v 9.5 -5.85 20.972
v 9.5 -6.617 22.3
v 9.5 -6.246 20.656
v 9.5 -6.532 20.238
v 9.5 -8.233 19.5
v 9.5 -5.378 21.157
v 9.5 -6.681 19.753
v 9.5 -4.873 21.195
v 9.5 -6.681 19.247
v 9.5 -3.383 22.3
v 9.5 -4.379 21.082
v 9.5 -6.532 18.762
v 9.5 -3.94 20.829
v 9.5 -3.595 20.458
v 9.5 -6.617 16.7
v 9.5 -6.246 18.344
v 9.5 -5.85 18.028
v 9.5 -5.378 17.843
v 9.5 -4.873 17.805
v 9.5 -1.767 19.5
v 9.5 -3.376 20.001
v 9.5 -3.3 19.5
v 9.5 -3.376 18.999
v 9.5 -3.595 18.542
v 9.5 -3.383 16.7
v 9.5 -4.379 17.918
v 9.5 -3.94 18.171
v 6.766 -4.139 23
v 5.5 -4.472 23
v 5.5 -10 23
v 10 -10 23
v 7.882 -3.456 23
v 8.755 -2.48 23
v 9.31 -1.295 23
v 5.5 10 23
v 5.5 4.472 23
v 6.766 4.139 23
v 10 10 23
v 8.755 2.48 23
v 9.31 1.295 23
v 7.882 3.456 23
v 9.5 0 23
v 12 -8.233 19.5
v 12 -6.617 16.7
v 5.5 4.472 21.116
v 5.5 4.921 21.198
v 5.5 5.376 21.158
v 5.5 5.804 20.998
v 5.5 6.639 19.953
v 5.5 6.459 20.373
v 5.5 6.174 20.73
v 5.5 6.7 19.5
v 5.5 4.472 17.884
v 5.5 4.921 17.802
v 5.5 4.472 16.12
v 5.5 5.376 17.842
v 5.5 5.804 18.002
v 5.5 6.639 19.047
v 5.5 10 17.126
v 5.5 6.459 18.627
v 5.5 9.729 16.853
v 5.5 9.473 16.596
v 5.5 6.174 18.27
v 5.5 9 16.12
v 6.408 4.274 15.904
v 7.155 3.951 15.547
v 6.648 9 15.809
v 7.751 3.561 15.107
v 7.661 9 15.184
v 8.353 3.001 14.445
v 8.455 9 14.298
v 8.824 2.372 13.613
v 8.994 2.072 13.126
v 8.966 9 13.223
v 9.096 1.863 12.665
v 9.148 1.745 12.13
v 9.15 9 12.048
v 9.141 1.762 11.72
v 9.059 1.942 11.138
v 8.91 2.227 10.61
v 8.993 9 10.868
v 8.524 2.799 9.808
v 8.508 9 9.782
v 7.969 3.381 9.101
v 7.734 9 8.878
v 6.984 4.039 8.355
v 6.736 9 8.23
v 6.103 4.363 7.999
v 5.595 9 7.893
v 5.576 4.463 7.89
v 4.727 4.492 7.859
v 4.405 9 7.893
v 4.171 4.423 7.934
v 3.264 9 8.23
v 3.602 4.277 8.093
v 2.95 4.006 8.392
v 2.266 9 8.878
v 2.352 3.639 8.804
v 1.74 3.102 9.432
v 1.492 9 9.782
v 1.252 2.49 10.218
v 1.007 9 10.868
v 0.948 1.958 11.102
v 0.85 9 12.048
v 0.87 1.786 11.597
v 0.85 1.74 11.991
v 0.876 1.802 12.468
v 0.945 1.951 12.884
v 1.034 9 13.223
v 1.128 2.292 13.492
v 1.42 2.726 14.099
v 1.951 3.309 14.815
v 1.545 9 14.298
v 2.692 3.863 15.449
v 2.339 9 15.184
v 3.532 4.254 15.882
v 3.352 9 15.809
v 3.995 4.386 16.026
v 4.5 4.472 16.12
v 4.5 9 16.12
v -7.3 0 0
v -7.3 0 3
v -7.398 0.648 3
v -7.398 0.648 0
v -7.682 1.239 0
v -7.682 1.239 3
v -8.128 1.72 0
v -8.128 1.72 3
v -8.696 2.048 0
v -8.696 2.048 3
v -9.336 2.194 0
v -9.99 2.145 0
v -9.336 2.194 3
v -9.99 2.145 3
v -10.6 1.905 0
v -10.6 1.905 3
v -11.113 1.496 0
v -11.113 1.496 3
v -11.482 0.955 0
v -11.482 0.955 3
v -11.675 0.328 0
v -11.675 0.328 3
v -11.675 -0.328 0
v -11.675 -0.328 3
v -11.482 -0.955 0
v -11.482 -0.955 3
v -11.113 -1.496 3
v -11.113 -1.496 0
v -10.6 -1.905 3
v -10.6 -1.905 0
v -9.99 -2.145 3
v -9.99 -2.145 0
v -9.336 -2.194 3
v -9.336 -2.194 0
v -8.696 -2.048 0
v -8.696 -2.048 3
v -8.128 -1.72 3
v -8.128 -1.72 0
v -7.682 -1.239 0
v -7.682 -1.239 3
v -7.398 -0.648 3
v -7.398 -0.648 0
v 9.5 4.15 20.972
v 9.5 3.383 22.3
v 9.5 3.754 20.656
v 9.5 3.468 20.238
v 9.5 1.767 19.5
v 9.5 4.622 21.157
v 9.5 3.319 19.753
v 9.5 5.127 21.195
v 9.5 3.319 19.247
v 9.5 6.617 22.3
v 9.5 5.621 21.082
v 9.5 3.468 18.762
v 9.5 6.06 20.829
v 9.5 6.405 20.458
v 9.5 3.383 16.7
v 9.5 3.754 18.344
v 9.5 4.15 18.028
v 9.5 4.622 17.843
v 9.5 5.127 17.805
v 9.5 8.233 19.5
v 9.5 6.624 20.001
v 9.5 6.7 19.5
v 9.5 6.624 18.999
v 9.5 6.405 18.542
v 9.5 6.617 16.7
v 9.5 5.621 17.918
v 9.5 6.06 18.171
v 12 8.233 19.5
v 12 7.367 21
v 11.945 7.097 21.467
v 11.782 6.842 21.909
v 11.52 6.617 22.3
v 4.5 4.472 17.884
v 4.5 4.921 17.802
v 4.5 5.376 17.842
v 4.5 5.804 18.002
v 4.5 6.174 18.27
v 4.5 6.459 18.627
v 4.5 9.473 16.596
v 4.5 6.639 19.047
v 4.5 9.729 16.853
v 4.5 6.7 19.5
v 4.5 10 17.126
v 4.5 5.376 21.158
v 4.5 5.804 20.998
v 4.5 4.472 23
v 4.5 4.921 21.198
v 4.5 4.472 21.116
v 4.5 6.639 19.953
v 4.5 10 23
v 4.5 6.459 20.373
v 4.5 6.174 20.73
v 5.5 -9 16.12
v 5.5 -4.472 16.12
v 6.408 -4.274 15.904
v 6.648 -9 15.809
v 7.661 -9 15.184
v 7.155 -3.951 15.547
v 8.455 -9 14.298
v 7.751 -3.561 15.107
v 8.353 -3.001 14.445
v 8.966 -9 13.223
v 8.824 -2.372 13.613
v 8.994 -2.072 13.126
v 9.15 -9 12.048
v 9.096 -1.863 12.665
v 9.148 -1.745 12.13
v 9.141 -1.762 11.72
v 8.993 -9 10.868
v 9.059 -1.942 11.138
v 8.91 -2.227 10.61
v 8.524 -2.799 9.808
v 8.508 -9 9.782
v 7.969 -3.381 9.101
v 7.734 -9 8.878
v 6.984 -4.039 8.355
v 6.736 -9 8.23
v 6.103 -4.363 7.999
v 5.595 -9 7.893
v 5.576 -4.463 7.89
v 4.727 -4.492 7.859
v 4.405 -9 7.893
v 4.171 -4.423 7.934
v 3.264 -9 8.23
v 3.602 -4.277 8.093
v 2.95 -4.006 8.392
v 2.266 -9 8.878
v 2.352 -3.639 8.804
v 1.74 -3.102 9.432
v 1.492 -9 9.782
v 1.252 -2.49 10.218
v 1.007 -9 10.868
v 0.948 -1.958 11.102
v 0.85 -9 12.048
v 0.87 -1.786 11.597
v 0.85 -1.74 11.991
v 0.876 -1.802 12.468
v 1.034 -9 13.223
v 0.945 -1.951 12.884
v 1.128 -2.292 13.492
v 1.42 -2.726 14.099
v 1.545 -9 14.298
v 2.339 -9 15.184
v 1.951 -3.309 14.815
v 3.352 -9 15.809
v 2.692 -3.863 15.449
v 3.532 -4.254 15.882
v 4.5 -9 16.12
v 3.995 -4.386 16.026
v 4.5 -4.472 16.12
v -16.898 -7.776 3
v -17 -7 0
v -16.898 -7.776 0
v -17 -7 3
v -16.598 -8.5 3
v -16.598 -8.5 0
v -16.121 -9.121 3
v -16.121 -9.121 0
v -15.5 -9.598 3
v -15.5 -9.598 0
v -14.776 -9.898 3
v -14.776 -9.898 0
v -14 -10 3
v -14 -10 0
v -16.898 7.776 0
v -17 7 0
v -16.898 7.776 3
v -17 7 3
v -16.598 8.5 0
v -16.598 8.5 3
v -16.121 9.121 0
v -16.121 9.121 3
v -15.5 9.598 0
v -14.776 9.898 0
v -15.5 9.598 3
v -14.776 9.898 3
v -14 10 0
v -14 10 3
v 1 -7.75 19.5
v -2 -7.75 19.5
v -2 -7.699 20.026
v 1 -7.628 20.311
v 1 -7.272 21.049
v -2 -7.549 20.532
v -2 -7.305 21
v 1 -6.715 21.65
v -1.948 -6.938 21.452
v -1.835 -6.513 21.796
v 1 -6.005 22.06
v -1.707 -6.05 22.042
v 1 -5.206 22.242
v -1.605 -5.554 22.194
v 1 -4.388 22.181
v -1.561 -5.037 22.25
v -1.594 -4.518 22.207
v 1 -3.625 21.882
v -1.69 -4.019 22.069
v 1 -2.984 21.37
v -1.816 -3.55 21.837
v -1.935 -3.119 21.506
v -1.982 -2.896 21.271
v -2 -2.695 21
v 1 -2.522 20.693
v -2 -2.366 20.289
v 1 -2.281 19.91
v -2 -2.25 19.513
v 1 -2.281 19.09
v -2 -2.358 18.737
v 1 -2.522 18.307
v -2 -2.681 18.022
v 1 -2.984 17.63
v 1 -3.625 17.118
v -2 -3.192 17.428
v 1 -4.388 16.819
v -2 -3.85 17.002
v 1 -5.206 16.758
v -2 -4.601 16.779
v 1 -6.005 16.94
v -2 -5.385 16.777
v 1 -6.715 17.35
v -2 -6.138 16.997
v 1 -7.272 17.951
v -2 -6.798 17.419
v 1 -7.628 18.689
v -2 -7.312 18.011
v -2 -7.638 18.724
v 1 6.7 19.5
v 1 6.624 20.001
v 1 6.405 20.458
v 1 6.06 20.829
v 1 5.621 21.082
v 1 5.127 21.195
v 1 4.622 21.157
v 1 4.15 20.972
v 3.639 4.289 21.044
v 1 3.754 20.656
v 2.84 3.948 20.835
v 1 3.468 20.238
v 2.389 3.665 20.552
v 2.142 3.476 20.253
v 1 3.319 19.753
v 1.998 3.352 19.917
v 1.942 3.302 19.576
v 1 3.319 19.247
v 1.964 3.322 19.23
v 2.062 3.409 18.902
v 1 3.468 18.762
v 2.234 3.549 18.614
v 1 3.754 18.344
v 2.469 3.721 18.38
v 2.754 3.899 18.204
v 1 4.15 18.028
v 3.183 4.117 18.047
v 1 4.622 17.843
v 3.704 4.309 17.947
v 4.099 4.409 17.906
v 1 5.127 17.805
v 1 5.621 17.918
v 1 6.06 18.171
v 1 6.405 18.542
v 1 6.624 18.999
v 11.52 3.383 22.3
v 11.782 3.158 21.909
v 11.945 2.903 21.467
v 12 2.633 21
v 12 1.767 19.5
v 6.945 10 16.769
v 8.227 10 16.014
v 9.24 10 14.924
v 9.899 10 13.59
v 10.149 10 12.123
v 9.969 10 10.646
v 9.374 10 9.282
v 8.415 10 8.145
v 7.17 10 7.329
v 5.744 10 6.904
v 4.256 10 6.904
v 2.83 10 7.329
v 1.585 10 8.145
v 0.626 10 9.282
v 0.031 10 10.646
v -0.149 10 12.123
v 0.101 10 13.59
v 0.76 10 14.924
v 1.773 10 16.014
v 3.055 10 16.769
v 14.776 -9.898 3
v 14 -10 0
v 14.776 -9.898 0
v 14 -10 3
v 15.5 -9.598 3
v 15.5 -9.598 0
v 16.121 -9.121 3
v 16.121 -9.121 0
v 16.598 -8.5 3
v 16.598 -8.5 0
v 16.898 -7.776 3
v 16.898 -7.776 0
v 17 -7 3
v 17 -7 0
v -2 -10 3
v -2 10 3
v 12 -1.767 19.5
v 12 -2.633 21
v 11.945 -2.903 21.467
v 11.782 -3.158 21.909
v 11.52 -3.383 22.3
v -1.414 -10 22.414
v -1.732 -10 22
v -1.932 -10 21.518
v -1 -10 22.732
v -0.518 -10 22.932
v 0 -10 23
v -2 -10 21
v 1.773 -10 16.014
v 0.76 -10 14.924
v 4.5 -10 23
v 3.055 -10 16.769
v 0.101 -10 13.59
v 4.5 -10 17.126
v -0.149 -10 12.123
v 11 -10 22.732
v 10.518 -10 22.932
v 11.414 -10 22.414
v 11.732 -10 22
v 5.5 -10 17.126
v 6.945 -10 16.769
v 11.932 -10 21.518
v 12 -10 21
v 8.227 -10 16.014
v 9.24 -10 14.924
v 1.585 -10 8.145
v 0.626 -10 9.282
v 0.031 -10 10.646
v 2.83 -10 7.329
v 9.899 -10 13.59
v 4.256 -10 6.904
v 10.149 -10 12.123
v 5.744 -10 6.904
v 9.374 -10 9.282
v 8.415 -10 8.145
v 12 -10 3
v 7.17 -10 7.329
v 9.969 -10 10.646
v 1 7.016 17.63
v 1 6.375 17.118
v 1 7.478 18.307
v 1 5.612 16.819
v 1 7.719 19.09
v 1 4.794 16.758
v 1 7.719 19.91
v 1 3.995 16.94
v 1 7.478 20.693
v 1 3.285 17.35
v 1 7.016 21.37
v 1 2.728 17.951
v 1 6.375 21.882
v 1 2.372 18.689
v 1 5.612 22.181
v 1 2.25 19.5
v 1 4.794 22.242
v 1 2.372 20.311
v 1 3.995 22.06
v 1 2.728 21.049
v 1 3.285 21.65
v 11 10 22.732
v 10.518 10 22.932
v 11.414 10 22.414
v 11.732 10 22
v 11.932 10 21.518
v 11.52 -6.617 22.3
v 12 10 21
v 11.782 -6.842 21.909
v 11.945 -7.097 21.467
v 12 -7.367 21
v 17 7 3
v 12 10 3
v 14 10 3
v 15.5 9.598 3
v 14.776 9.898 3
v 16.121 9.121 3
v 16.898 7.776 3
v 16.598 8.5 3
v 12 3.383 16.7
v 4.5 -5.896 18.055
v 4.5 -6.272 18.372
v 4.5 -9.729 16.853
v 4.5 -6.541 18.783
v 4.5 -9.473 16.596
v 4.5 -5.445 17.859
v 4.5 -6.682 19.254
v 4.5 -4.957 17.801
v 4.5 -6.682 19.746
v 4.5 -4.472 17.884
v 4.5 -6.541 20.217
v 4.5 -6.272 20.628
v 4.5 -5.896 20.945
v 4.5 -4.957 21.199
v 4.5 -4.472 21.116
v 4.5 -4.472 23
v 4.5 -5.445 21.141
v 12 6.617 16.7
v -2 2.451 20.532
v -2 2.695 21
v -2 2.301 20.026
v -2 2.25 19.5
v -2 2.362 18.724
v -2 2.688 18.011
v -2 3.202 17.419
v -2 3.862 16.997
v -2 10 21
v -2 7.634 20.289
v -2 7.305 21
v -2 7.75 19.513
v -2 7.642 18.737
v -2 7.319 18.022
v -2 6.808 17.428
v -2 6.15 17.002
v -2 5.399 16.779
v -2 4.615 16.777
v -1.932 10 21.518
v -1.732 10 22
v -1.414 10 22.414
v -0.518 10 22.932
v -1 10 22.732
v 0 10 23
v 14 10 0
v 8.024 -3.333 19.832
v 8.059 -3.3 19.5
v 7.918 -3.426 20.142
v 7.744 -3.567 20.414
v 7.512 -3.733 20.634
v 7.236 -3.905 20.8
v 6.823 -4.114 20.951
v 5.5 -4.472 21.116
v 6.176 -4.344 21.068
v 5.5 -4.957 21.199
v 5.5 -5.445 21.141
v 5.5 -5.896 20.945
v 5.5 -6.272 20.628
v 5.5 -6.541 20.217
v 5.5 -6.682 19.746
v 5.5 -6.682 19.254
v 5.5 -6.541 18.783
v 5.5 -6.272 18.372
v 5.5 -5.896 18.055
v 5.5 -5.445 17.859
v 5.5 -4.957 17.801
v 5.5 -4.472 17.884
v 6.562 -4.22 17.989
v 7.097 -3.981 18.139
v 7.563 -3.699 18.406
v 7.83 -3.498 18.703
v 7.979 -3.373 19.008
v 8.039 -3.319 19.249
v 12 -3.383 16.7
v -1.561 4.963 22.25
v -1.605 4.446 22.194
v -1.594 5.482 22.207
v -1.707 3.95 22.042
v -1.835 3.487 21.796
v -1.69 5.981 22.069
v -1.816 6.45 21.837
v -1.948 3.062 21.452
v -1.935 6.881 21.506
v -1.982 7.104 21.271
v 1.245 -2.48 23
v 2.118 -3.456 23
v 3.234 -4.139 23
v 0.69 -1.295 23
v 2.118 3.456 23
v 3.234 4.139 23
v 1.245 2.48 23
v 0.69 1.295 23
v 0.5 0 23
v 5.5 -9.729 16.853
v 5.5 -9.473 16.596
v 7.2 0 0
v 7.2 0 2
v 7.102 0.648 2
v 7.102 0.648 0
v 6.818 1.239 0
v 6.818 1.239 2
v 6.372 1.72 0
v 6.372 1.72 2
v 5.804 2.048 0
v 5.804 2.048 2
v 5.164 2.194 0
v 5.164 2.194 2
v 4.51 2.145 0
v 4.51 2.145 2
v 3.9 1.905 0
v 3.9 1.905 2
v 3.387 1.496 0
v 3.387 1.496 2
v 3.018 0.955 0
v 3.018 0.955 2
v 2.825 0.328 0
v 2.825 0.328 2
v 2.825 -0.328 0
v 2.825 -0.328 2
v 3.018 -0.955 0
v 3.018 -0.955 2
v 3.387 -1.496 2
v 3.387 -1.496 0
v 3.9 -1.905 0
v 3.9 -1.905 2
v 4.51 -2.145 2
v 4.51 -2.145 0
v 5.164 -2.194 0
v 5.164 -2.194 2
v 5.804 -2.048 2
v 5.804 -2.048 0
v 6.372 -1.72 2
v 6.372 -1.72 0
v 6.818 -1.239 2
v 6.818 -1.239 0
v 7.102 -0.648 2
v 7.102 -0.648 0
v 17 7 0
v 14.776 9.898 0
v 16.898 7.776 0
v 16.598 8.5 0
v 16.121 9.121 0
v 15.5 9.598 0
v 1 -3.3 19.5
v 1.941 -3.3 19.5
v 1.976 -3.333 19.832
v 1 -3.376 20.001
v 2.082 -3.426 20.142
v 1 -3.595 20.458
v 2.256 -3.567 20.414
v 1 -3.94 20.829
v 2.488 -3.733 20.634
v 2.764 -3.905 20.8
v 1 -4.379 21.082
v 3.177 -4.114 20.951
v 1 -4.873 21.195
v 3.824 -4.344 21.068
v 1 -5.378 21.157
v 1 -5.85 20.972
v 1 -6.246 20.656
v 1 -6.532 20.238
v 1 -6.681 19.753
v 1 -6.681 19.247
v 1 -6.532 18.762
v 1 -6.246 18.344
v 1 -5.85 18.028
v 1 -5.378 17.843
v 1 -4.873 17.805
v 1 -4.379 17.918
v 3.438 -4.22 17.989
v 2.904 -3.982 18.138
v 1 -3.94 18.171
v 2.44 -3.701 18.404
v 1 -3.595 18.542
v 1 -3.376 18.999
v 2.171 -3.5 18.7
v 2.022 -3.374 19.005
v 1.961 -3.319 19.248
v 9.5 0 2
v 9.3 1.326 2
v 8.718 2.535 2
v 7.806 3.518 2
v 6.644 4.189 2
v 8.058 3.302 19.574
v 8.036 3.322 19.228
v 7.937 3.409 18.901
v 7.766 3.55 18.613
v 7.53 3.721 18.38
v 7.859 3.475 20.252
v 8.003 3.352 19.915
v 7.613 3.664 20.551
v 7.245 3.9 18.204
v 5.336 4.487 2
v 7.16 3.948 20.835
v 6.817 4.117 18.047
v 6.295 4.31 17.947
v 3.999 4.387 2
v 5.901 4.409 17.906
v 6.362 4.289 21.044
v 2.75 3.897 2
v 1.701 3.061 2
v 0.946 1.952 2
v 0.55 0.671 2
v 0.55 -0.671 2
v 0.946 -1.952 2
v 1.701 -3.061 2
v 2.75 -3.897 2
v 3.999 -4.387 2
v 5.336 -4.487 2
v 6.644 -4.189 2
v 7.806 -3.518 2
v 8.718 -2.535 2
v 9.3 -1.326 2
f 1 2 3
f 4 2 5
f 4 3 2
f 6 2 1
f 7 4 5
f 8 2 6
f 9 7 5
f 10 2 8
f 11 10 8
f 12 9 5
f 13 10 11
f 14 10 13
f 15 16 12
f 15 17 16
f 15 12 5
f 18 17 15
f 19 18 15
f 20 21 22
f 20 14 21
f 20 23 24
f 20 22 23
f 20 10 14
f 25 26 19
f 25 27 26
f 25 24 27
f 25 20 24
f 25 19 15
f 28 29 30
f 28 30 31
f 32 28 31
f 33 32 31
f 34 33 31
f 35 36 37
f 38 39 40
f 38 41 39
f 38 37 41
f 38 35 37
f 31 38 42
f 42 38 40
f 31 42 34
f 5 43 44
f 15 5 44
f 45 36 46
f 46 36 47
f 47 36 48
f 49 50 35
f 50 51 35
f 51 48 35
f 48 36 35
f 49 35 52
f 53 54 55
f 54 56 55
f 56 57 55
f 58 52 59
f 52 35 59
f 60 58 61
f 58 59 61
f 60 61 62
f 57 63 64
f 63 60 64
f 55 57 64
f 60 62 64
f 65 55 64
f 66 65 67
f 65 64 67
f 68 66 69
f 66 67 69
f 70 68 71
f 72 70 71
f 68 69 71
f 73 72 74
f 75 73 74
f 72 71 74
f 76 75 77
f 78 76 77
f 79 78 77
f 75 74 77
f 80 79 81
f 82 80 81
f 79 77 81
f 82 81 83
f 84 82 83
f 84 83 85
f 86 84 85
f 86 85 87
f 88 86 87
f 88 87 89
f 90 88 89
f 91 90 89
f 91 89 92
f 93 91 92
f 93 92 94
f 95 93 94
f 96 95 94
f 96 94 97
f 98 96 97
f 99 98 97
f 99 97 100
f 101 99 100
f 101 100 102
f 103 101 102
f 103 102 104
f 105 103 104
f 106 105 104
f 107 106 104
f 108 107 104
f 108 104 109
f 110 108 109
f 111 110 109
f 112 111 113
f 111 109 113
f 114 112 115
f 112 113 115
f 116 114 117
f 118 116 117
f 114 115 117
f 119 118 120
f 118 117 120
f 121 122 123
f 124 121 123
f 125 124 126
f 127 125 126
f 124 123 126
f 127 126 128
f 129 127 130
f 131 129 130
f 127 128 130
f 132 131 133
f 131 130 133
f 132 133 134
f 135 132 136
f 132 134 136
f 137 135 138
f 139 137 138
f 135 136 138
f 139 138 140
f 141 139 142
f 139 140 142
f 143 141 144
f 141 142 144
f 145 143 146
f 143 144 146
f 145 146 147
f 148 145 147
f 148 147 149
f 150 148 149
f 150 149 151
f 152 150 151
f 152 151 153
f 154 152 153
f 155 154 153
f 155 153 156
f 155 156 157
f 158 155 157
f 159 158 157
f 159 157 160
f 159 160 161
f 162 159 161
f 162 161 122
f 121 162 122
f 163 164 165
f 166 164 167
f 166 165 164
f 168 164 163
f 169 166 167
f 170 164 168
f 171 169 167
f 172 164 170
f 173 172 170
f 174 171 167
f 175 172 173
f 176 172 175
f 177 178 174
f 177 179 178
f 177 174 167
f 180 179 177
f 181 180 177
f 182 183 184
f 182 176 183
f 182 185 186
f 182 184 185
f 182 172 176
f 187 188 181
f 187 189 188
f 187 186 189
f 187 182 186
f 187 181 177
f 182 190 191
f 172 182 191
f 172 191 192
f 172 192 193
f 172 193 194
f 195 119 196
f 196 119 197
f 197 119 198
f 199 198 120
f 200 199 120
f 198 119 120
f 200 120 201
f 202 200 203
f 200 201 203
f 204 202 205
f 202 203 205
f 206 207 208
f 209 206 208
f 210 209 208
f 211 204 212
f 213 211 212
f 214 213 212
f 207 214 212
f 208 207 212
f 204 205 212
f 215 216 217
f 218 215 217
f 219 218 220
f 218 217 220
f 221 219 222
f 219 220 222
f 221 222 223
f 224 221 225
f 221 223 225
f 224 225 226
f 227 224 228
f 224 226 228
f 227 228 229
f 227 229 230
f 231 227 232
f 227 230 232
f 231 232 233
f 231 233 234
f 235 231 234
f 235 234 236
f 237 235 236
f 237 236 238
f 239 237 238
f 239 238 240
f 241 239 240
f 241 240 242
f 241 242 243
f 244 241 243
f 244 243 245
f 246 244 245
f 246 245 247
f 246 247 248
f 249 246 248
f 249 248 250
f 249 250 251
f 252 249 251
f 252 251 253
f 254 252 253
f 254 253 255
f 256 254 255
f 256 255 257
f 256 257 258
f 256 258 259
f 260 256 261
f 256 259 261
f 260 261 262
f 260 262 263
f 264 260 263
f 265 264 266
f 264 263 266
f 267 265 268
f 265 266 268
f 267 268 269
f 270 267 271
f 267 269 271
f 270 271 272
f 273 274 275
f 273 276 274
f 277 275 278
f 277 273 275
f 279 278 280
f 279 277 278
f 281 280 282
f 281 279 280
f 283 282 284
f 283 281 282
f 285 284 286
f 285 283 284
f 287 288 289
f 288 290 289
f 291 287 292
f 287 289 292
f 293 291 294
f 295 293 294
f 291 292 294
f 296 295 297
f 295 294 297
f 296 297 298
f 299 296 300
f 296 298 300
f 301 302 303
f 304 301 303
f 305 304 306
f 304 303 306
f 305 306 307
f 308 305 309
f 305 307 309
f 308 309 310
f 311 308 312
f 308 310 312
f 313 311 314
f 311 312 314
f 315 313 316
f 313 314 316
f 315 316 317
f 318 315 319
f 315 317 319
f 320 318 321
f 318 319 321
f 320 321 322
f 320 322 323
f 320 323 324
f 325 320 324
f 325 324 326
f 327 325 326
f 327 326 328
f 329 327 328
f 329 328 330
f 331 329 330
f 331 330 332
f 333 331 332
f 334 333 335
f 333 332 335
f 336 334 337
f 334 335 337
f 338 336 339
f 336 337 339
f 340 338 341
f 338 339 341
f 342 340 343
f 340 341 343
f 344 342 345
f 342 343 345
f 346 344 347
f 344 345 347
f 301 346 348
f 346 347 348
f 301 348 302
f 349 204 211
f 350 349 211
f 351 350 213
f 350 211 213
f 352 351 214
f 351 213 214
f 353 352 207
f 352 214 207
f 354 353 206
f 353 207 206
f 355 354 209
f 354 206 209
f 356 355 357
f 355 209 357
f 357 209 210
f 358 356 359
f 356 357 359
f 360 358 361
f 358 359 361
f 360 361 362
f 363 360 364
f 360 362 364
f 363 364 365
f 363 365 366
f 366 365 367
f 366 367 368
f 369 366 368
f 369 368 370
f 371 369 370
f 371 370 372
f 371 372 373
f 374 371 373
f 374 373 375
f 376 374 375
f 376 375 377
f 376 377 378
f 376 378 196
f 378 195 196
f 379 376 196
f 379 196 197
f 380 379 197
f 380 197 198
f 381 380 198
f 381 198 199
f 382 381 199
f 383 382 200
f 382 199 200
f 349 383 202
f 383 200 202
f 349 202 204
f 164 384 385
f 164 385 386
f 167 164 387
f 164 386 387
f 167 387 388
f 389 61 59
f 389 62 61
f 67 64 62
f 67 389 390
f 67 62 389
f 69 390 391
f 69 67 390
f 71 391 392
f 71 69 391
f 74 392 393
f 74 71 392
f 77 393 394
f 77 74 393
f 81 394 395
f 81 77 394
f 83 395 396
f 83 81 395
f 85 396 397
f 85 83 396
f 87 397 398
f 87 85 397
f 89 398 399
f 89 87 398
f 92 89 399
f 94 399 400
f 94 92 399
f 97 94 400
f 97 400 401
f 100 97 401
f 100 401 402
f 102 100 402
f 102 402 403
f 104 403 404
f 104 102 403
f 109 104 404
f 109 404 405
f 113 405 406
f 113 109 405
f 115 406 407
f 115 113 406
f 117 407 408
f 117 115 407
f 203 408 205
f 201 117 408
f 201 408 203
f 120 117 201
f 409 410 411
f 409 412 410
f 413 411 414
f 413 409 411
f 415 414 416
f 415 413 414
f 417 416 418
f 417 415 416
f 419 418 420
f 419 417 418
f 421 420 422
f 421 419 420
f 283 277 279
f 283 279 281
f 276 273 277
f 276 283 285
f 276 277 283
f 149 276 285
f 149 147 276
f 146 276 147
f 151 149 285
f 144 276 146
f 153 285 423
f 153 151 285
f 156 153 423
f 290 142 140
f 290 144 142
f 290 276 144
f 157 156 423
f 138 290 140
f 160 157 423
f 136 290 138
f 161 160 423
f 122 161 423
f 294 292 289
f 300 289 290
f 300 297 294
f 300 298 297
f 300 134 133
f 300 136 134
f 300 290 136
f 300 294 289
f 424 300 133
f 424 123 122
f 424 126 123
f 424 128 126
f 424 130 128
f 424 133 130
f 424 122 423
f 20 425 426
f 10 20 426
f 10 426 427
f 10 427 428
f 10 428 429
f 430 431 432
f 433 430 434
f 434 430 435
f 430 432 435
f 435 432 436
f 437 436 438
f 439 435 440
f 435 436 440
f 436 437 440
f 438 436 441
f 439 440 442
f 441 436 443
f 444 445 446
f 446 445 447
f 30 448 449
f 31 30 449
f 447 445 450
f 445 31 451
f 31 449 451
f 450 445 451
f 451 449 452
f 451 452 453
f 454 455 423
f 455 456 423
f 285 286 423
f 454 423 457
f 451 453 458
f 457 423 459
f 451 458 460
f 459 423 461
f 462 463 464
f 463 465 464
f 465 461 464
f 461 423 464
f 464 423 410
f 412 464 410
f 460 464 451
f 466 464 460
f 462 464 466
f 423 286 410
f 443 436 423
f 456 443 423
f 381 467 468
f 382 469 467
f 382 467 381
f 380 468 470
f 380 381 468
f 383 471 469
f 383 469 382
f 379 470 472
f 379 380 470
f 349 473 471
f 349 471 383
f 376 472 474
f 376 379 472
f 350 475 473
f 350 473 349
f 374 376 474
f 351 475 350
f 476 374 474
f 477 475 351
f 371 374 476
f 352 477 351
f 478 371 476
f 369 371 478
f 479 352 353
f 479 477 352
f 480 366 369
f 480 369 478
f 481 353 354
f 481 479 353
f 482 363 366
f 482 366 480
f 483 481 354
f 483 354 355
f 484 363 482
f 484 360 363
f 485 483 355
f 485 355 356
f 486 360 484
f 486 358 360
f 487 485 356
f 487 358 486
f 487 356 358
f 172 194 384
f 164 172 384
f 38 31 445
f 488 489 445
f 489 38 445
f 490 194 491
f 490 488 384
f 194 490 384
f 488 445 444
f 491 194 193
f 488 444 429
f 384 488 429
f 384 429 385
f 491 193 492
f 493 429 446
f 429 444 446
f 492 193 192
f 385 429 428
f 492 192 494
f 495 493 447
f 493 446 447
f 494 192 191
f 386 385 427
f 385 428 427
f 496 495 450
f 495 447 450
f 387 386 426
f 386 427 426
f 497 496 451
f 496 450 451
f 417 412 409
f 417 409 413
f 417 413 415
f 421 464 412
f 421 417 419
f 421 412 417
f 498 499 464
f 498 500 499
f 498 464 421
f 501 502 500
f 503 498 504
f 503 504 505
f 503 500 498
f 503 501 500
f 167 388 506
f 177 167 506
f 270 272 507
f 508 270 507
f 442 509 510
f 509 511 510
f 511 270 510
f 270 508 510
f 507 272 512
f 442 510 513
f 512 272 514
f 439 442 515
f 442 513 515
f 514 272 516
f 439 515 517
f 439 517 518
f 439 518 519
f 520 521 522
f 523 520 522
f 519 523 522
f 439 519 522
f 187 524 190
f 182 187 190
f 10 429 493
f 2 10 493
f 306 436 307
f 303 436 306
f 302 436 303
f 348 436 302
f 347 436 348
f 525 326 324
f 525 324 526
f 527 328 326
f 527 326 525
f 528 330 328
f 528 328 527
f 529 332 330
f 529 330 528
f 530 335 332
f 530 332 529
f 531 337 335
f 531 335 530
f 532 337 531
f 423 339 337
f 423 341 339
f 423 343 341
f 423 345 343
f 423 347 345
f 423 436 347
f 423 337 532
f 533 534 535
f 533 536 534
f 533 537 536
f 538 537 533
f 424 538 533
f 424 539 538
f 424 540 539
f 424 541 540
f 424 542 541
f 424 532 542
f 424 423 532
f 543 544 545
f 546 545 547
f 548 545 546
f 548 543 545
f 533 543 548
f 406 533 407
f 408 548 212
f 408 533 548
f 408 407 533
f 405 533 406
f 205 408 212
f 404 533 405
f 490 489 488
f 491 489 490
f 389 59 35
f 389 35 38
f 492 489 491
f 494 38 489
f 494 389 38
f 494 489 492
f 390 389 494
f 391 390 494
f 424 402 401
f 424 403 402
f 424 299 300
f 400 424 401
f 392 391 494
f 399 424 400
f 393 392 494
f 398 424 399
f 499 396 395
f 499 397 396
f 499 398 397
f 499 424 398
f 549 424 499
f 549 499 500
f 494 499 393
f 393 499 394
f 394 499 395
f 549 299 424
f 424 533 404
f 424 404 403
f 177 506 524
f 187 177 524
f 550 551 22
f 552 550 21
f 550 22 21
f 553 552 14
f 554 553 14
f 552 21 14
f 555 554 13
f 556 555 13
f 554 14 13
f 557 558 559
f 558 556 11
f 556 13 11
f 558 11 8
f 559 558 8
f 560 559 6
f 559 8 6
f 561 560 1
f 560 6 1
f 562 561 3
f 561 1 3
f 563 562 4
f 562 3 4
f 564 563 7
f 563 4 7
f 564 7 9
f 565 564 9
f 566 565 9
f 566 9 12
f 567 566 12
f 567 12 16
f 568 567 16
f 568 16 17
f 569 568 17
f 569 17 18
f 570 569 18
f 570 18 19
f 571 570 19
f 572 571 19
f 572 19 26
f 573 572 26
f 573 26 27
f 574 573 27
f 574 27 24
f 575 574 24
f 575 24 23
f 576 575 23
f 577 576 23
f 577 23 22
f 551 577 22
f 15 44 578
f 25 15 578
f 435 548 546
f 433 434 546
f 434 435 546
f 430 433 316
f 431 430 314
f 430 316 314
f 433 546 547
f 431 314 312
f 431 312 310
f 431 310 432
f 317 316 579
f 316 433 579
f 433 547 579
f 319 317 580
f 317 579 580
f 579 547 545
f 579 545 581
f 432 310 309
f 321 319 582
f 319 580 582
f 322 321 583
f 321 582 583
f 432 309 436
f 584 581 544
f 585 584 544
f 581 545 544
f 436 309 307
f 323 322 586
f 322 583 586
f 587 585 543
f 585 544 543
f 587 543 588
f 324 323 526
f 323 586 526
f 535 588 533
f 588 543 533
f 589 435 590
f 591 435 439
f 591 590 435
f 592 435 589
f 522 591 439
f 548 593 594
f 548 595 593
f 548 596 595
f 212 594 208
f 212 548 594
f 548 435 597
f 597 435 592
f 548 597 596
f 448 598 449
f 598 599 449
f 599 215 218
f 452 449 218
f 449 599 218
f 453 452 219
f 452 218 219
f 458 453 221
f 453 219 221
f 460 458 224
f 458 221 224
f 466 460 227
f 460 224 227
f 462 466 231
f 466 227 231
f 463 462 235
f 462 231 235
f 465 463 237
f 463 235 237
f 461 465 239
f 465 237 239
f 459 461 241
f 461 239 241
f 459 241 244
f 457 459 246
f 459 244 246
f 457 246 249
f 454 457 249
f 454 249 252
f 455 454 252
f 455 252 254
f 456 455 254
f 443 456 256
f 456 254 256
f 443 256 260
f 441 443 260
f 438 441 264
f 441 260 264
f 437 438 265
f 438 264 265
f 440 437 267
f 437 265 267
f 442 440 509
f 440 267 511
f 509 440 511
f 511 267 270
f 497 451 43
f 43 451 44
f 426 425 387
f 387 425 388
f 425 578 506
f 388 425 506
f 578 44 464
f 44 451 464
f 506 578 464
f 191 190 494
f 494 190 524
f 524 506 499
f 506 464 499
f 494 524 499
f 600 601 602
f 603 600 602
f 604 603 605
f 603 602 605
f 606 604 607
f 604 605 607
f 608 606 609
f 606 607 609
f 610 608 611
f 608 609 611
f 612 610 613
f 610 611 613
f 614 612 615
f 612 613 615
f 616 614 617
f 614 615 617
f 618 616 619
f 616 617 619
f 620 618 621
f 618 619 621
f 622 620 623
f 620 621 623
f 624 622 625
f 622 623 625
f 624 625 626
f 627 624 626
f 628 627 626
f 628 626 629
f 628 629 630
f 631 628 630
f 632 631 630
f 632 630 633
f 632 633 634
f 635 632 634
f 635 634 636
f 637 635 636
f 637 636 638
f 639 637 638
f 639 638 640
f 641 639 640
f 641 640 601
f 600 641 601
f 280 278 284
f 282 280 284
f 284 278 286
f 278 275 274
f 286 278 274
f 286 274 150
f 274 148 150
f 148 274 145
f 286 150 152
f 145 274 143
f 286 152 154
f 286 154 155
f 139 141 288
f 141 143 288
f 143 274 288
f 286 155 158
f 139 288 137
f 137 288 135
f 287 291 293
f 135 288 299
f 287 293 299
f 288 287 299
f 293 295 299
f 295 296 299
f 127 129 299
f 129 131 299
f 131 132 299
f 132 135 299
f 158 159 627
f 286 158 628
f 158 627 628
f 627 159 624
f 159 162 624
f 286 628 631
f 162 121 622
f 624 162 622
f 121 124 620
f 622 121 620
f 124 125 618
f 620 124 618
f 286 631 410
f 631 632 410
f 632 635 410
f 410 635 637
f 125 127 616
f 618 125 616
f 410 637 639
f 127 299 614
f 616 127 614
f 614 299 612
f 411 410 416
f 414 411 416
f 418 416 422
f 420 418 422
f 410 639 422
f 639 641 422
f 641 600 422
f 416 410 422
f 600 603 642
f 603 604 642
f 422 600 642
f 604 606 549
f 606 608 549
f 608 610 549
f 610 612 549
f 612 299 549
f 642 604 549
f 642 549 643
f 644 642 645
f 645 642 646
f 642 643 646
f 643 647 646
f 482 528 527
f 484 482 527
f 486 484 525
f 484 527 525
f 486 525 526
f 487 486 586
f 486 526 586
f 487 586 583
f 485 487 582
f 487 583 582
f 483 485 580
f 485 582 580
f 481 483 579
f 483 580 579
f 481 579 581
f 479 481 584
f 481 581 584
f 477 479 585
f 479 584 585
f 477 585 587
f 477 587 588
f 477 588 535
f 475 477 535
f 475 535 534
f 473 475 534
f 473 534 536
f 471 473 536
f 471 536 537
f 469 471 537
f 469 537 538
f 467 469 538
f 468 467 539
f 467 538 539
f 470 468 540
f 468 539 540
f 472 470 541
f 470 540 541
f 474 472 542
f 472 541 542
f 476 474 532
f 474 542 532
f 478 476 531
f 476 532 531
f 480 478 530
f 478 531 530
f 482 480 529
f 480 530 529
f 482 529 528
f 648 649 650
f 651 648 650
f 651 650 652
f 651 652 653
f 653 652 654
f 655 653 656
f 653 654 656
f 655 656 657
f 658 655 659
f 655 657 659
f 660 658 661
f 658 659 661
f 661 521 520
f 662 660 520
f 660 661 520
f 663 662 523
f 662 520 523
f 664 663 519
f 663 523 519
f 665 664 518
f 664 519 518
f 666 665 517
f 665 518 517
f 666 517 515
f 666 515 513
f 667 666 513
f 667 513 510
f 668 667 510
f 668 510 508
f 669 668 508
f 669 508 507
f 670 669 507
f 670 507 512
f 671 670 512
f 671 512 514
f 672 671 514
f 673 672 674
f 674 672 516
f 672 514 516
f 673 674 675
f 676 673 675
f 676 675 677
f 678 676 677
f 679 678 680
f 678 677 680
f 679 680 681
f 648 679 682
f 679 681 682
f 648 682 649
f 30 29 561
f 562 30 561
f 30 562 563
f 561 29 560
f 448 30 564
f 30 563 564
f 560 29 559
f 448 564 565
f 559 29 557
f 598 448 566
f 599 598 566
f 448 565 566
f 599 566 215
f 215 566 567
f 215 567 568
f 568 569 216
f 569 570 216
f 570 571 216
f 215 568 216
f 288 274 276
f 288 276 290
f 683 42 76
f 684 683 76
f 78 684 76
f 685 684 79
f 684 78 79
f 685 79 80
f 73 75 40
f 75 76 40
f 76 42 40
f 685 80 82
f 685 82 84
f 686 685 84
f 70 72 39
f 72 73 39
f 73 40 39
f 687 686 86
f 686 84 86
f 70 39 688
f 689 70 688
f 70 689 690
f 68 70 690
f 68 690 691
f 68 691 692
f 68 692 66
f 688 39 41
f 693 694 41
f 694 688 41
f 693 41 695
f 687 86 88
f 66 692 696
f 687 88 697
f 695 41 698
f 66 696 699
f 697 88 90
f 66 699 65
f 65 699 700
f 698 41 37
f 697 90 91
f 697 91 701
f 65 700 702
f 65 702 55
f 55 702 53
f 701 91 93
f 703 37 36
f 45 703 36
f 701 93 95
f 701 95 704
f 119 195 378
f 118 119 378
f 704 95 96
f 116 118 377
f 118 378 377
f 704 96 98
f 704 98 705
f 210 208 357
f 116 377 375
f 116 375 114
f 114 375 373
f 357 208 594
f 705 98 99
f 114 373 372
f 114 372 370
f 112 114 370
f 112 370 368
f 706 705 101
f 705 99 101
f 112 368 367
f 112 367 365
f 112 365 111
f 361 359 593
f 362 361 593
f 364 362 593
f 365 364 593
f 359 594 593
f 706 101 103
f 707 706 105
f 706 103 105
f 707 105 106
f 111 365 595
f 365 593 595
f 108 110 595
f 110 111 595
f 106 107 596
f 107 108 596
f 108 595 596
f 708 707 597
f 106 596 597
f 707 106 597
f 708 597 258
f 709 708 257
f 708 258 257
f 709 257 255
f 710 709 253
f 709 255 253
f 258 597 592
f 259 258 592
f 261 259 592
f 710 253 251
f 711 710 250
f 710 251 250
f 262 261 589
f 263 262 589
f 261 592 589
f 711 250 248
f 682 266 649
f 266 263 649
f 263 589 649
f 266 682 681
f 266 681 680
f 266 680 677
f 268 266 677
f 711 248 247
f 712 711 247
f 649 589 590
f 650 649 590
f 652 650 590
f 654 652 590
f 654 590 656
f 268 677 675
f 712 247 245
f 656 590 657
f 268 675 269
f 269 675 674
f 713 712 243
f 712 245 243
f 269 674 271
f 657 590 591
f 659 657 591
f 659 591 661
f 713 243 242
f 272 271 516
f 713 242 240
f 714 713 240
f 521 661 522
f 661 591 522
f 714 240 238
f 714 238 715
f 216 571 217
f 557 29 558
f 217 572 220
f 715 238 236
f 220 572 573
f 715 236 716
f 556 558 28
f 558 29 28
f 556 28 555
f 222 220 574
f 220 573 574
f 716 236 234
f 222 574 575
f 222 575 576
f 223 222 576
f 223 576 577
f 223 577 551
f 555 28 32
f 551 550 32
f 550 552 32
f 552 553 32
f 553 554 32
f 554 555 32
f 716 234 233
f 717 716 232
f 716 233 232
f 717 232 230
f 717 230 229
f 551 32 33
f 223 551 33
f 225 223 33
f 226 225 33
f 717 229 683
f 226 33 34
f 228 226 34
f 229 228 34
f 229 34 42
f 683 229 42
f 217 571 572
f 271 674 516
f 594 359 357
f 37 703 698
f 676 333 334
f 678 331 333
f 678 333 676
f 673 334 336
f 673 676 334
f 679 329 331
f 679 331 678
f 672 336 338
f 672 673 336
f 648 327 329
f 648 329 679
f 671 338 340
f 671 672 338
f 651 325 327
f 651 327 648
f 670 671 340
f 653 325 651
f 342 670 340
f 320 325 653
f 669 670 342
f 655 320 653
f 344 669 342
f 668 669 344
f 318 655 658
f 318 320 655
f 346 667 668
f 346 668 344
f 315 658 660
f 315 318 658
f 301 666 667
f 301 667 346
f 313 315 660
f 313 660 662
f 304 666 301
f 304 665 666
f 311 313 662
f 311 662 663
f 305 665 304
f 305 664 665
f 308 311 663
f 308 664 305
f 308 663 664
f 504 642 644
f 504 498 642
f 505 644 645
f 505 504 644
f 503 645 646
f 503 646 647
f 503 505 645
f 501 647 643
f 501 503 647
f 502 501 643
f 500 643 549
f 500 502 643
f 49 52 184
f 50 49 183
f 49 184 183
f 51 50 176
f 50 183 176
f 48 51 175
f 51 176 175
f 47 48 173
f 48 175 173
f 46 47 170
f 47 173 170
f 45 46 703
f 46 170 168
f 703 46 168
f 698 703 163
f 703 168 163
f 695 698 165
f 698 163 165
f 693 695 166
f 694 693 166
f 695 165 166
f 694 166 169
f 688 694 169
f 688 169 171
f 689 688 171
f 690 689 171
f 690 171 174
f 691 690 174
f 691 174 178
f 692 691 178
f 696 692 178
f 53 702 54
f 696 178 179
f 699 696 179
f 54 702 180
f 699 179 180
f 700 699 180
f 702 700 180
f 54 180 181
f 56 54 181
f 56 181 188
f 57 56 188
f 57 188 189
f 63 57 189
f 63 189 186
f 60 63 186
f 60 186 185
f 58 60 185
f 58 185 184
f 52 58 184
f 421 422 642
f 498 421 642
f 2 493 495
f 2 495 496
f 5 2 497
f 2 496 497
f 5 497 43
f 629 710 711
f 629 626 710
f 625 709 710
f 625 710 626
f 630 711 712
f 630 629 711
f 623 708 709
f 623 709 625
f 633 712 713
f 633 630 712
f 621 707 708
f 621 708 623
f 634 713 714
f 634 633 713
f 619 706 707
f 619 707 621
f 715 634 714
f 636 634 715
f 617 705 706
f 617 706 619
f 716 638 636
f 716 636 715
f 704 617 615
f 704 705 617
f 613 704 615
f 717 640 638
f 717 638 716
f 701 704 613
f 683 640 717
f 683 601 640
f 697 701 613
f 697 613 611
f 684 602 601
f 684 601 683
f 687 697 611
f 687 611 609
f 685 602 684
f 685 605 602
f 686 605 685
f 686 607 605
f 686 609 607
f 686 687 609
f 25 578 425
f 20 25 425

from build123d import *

# Parameters (mm, degrees)
SKETCH1_W           = 34
SKETCH1_H           = 20
BOSS_EXTRUDE1_DEPTH = 3
FILLET1_R           = 3
SKETCH2_W           = 14
SKETCH2_H           = 20
BOSS_EXTRUDE2_DEPTH = 20
CUT_EXTRUDE1_DEPTH  = 35.899856733
CHAMFER1_SIZE       = 1
SKETCH4_R           = 2.2
CUT_EXTRUDE2_DEPTH  = 29.08914381
SKETCH5_R           = 1.7
CUT_EXTRUDE3_DEPTH  = 39.340579025
FILLET2_R           = 2
CUT_EXTRUDE4_DEPTH  = 2.5
SKETCH7_R           = 2.75
CUT_EXTRUDE5_DEPTH  = 3
SKETCH8_R           = 2.2
CUT_EXTRUDE6_DEPTH  = 31.298514848
SKETCH9_R           = 4.5
CUT_EXTRUDE7_DEPTH  = 21


with BuildPart() as part:
    # Sketch1 → Boss-Extrude1 (new body)
    with BuildSketch(Plane.XY):
        Rectangle(SKETCH1_W, SKETCH1_H)
    extrude(amount=BOSS_EXTRUDE1_DEPTH)

    # Fillet1
    fillet1_edges = [part.edges().sort_by_distance(p)[0] for p in [
        (17, -10, 1.5),
        (-17, -10, 1.5),
        (-17, 10, 1.5),
        (17, 10, 1.5),
    ]]
    fillet(fillet1_edges, radius=FILLET1_R)

    # Sketch2 → Boss-Extrude2 (add)
    with BuildSketch(Plane.XY.offset(3)):
        with Locations((5, 0)):
            Rectangle(SKETCH2_W, SKETCH2_H)
    extrude(amount=BOSS_EXTRUDE2_DEPTH)

    # Sketch3 → Cut-Extrude1 (cut, through all)
    with BuildSketch(Plane(origin=(0, 10, 0), x_dir=(1, 0, 0), z_dir=(0, 1, 0))):
        with BuildLine():
            Line((4.5, -16.119769411), (4.5, -23))
            Line((4.5, -23), (5.5, -23))
            Line((5.5, -23), (5.5, -16.119769411))
            ThreePointArc((5.5, -16.119769411), (5, -7.85), (4.5, -16.119769411))
        make_face()
    extrude(amount=-CUT_EXTRUDE1_DEPTH, mode=Mode.SUBTRACT)

    # Chamfer1
    chamfer1_edges = [part.edges().sort_by_distance(p)[0] for p in [
        (5, -10, 7.85),
        (5, 10, 7.85),
    ]]
    chamfer(chamfer1_edges, length=CHAMFER1_SIZE)

    # Sketch4 → Cut-Extrude2 (cut, through all)
    with BuildSketch(Plane.XY.offset(3)):
        with Locations((-9.5, 0)):
            Circle(SKETCH4_R)
    extrude(amount=-CUT_EXTRUDE2_DEPTH, mode=Mode.SUBTRACT)

    # Sketch5 → Cut-Extrude3 (cut, through all)
    with BuildSketch(Plane(origin=(12, 0, 0), x_dir=(0, 0, -1), z_dir=(1, 0, 0))):
        with Locations(Location((-19.5, 5, 0), (0, 0, 90))):
            Circle(SKETCH5_R)
        with Locations(Location((-19.5, -5, 0), (0, 0, 90))):
            Circle(SKETCH5_R)
    extrude(amount=-CUT_EXTRUDE3_DEPTH, mode=Mode.SUBTRACT)

    # Fillet2
    # the kernel refuses this fillet: 2 mm, written as the material it takes off along each edge
    with BuildSketch(Plane(origin=(12, -15, 23), x_dir=(-1, 0, 0), z_dir=(0, 1, 0)), Plane(origin=(-2, 15, 23), x_dir=(1, 0, 0), z_dir=(0, -1, 0))) as fillet2_piece_1:
        with BuildLine():
            CenterArc((FILLET2_R, -FILLET2_R), FILLET2_R, 90, 90)
            Line((0, -FILLET2_R), (0, 0))
            Line((0, 0), (FILLET2_R, 0))
        make_face()
    extrude(amount=30, mode=Mode.SUBTRACT)

    # Sketch6 → Cut-Extrude4 (cut)
    with BuildSketch(Plane(origin=(12, 0, 0), x_dir=(0, 0, -1), z_dir=(1, 0, 0))):
        Polygon((-16.7, 3.383419246), (-16.7, 6.616580754), (-19.5, 8.233161507), (-22.3, 6.616580754), (-22.3, 3.383419246), (-19.5, 1.766838493), align=None)
        Polygon((-16.7, -3.383419246), (-19.5, -1.766838493), (-22.3, -3.383419246), (-22.3, -6.616580754), (-19.5, -8.233161507), (-16.7, -6.616580754), align=None)
    extrude(amount=-CUT_EXTRUDE4_DEPTH, mode=Mode.SUBTRACT)

    # Sketch7 → Cut-Extrude5 (cut)
    with BuildSketch(Plane.ZY.offset(2)):
        with Locations(Location((19.5, 5, 0), (0, 0, 270))):
            Circle(SKETCH7_R)
        with Locations(Location((19.5, -5, 0), (0, 0, 270))):
            Circle(SKETCH7_R)
    extrude(amount=-CUT_EXTRUDE5_DEPTH, mode=Mode.SUBTRACT)

    # Sketch8 → Cut-Extrude6 (cut, through all)
    with BuildSketch(Plane.XY.offset(23)):
        with Locations((5, 0)):
            Circle(SKETCH8_R)
    extrude(amount=-CUT_EXTRUDE6_DEPTH, mode=Mode.SUBTRACT)

    # Sketch9 → Cut-Extrude7 (cut)
    with BuildSketch(Plane.XY.offset(23)):
        with Locations((5, 0)):
            Circle(SKETCH9_R)
    extrude(amount=-CUT_EXTRUDE7_DEPTH, mode=Mode.SUBTRACT)


solid = part.part
